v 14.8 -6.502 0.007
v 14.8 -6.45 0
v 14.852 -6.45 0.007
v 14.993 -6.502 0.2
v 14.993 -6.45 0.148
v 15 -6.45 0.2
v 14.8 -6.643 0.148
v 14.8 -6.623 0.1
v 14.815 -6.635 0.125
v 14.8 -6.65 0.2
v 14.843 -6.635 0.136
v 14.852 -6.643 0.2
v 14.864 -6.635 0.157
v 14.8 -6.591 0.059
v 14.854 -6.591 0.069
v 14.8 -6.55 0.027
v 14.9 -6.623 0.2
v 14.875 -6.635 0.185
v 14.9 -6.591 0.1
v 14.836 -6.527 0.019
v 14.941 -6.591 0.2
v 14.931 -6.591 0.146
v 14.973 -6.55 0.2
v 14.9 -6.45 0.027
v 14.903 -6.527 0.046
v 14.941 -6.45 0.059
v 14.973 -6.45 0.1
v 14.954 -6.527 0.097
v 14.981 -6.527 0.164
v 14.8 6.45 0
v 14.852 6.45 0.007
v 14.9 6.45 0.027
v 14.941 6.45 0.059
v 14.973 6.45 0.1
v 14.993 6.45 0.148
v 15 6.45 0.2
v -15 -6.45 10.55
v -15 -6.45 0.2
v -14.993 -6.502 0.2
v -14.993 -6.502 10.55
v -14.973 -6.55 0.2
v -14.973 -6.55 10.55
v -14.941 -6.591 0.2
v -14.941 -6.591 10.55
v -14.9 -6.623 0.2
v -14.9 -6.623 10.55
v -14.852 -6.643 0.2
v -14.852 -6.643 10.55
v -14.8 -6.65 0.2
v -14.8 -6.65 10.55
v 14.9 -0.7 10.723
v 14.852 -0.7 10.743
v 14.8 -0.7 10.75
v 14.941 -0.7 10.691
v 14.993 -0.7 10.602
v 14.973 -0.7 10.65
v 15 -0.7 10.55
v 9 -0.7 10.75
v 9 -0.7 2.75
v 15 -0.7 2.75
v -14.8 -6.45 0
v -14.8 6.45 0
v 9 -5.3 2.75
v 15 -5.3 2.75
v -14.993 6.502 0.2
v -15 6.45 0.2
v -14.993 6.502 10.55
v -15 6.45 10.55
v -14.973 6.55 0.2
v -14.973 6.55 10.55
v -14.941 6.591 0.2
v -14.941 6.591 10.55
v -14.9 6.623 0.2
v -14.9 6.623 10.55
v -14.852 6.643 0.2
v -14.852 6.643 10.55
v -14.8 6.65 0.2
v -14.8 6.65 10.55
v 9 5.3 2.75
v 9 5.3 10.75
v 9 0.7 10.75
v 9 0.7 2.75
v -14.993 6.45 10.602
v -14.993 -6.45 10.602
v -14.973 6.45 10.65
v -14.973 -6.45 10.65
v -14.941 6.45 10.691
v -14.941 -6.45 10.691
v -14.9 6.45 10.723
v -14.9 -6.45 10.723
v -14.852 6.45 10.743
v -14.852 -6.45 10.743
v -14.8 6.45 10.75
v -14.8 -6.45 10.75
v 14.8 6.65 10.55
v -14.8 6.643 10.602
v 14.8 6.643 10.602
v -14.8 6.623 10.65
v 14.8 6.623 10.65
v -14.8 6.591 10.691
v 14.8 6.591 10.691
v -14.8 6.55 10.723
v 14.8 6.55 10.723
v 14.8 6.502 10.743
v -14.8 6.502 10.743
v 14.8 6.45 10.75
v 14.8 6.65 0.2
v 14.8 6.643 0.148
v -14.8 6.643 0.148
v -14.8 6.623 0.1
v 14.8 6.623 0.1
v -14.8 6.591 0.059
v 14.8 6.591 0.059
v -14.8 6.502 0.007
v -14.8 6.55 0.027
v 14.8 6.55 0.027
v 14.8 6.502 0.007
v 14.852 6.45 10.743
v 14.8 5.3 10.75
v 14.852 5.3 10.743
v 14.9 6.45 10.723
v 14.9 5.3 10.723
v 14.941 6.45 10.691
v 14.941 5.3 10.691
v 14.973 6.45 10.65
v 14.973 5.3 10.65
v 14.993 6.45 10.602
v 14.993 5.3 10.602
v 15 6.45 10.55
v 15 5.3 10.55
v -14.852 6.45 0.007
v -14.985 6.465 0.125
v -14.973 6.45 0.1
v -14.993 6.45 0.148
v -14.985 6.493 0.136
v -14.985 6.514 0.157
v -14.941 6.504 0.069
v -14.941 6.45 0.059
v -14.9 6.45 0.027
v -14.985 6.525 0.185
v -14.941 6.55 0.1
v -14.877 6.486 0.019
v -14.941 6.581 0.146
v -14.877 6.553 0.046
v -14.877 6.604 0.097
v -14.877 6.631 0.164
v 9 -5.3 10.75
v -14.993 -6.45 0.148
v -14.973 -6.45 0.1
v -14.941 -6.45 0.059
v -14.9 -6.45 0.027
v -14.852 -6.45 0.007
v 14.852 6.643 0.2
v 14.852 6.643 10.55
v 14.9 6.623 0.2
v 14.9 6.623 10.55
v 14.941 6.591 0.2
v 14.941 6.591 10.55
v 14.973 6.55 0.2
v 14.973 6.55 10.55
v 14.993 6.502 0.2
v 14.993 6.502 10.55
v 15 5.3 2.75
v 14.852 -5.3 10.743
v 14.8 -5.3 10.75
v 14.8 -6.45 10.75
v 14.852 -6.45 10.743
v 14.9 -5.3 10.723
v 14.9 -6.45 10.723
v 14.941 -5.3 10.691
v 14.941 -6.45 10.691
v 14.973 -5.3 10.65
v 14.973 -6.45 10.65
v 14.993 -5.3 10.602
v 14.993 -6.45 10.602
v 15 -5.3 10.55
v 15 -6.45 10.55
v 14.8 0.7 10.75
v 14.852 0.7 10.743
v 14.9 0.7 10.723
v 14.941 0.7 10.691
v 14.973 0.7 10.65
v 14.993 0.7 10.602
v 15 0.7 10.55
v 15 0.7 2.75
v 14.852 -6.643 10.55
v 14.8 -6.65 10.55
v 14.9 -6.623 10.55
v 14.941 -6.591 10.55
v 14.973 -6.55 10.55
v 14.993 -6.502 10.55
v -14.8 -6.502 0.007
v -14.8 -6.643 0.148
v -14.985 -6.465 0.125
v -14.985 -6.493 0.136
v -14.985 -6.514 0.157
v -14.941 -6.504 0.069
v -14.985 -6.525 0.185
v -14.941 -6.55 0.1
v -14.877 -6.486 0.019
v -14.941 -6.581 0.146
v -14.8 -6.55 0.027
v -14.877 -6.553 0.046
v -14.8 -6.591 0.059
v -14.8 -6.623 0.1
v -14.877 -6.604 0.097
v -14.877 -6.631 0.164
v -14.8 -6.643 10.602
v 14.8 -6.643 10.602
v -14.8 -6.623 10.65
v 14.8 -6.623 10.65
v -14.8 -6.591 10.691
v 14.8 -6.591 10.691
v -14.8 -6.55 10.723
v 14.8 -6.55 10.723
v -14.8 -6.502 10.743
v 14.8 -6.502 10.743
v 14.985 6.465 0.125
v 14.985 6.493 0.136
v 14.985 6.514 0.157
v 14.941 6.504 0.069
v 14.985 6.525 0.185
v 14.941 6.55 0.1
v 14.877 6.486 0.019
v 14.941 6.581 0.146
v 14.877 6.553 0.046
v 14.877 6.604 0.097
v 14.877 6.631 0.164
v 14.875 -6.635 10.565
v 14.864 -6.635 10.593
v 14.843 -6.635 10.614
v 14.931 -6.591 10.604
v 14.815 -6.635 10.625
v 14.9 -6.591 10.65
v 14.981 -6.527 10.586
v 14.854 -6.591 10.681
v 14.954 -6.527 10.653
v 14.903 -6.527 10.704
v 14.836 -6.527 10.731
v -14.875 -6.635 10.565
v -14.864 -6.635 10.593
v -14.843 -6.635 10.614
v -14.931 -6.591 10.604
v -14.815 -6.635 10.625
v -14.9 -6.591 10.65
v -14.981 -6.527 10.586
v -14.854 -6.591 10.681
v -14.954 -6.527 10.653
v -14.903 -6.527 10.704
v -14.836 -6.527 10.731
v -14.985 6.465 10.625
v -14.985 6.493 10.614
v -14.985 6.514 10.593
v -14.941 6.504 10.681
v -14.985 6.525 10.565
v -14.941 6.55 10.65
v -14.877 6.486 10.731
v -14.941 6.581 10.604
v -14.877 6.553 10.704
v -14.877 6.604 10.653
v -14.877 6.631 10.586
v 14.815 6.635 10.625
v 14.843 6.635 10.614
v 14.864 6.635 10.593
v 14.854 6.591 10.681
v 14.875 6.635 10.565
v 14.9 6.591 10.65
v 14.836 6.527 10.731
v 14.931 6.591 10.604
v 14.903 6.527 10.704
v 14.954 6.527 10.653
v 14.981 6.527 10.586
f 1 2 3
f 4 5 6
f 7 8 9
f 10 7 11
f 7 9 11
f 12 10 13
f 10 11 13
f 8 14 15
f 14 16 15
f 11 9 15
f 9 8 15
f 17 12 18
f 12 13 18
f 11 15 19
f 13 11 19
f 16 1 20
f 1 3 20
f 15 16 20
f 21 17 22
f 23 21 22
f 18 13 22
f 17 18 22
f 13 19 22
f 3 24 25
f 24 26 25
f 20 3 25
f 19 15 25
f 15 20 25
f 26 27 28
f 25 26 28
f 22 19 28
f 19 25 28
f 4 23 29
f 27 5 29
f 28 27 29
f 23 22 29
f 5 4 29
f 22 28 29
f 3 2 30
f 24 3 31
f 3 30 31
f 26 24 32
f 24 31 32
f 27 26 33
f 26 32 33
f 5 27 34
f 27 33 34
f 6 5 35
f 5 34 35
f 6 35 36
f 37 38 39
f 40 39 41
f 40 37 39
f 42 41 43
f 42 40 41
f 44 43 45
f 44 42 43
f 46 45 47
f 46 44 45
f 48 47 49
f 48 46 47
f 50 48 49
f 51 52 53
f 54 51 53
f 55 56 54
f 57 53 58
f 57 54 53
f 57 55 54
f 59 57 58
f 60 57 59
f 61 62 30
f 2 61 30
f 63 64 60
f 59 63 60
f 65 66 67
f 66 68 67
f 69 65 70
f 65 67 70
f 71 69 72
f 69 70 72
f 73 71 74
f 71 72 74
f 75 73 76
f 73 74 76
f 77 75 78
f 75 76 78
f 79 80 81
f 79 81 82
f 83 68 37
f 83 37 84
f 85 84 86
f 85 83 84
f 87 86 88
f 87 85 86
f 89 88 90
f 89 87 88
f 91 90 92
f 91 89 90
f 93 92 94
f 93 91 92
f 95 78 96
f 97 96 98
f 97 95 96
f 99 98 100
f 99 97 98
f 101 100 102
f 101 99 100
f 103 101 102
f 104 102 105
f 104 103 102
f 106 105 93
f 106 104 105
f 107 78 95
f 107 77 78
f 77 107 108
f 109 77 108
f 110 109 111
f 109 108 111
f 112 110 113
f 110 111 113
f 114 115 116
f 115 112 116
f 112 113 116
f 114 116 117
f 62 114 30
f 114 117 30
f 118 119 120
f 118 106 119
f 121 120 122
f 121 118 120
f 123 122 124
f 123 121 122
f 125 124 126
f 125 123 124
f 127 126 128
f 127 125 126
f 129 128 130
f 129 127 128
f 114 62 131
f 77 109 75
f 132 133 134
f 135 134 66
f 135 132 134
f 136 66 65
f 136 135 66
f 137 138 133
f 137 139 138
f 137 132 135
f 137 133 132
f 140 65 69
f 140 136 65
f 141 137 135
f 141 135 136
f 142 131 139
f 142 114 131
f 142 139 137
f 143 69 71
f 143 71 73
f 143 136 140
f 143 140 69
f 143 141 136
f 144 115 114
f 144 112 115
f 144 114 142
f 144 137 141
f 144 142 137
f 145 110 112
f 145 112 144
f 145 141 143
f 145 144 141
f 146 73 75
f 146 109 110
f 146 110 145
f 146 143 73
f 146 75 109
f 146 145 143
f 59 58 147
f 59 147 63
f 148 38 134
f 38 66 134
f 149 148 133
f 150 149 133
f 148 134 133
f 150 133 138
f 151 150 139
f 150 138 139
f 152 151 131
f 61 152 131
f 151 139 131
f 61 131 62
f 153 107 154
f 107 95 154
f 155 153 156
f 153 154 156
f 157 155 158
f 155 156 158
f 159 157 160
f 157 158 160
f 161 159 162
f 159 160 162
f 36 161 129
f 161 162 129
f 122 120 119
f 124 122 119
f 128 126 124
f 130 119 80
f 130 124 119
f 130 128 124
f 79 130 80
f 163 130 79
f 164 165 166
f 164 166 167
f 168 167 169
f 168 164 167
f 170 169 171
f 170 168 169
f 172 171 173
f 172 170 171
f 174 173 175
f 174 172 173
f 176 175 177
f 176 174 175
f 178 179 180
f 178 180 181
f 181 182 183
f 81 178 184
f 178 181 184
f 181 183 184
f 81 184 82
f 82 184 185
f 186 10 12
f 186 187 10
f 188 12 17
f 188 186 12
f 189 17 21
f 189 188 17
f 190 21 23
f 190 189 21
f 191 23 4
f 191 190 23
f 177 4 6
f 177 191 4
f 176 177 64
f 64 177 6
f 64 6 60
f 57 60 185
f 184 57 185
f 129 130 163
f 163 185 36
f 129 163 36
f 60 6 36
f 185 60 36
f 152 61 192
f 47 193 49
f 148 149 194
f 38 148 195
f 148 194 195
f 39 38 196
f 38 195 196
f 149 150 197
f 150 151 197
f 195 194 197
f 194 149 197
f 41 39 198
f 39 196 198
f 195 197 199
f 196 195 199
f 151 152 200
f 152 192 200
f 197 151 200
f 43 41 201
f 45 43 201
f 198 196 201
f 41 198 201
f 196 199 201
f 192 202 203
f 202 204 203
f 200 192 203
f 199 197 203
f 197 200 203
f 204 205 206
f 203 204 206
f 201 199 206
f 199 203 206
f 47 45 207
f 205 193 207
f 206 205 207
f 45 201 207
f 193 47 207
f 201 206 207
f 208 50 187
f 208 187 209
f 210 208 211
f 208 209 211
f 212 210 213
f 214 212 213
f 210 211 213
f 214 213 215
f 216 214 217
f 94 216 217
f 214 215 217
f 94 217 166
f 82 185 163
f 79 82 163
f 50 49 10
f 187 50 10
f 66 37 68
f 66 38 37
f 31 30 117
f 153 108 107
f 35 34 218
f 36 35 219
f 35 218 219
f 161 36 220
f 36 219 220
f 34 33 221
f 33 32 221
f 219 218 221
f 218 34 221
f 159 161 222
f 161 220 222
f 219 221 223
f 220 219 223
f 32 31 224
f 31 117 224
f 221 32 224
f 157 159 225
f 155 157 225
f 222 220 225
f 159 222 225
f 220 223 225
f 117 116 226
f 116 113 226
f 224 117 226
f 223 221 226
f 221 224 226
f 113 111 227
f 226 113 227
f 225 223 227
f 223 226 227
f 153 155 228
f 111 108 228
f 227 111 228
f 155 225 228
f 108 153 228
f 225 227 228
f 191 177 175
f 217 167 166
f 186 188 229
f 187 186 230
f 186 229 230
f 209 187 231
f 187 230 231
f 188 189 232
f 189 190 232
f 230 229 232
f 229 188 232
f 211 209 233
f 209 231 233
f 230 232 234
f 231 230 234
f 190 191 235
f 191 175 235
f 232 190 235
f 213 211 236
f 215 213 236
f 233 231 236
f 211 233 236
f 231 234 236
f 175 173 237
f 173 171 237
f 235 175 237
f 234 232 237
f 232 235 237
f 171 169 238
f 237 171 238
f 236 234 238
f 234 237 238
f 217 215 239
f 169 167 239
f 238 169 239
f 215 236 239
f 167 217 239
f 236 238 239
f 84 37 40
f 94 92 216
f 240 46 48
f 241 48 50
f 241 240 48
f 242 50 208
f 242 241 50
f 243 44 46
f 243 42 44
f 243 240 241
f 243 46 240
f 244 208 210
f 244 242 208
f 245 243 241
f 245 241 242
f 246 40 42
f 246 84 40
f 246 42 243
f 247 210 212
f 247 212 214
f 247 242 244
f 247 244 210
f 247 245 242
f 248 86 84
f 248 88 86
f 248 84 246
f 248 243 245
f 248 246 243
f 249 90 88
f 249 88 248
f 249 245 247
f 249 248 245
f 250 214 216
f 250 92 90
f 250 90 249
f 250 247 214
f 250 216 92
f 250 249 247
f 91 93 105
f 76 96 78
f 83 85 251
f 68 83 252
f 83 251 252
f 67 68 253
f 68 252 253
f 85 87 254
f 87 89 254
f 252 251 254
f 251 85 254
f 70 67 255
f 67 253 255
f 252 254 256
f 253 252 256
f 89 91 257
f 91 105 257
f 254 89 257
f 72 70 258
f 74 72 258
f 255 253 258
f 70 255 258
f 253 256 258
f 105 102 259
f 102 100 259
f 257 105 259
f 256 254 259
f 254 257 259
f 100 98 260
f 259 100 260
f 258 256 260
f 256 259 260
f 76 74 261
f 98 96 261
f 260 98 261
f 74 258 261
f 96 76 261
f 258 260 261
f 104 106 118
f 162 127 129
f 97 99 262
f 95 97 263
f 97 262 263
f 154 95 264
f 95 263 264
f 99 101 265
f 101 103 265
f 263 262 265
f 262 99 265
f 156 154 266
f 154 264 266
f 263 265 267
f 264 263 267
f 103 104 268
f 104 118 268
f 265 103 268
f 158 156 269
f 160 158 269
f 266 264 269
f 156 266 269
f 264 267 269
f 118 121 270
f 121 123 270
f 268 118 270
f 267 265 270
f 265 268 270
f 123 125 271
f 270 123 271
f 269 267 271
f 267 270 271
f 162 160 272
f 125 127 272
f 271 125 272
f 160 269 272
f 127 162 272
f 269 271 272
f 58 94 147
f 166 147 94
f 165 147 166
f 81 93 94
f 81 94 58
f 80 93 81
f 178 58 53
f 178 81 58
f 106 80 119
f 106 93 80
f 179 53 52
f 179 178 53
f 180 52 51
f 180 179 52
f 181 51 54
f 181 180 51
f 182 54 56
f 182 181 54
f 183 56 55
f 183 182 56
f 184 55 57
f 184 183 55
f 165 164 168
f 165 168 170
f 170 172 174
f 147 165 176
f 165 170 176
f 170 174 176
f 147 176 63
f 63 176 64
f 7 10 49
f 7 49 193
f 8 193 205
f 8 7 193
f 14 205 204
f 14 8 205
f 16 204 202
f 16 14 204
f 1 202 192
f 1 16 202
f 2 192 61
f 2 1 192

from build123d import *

# Parameters (mm, degrees)
SKETCH1_W           = 30
SKETCH1_H           = 13.3
BOSS_EXTRUDE1_DEPTH = 10.75
SKETCH2_W           = 8
SKETCH2_H           = 4.6
CUT_EXTRUDE1_DEPTH  = 6
FILLET1_R           = 0.2


with BuildPart() as part:
    # Sketch1 → Boss-Extrude1 (new body)
    with BuildSketch(Plane.XY):
        Rectangle(SKETCH1_W, SKETCH1_H)
    extrude(amount=BOSS_EXTRUDE1_DEPTH)

    # Sketch2 → Cut-Extrude1 (cut)
    with BuildSketch(Plane(origin=(15, 0, 0), x_dir=(0, 0, -1), z_dir=(1, 0, 0))):
        with Locations((-6.75, -3)):
            Rectangle(SKETCH2_W, SKETCH2_H)
        with Locations((-6.75, 3)):
            Rectangle(SKETCH2_W, SKETCH2_H)
    extrude(amount=-CUT_EXTRUDE1_DEPTH, mode=Mode.SUBTRACT)

    # Fillet1
    fillet1_edges = [part.edges().sort_by_distance(p)[0] for p in [
        (15, -5.975, 10.75),
        (15, 0, 10.75),
        (15, 5.975, 10.75),
        (0, 6.65, 10.75),
        (-15, 0, 10.75),
        (0, 6.65, 0),
        (15, 0, 0),
        (0, -6.65, 0),
        (-15, 0, 0),
        (-15, 6.65, 5.375),
        (15, 6.65, 5.375),
        (15, -6.65, 5.375),
        (-15, -6.65, 5.375),
        (0, -6.65, 10.75),
    ]]
    fillet(fillet1_edges, radius=FILLET1_R)


solid = part.part
